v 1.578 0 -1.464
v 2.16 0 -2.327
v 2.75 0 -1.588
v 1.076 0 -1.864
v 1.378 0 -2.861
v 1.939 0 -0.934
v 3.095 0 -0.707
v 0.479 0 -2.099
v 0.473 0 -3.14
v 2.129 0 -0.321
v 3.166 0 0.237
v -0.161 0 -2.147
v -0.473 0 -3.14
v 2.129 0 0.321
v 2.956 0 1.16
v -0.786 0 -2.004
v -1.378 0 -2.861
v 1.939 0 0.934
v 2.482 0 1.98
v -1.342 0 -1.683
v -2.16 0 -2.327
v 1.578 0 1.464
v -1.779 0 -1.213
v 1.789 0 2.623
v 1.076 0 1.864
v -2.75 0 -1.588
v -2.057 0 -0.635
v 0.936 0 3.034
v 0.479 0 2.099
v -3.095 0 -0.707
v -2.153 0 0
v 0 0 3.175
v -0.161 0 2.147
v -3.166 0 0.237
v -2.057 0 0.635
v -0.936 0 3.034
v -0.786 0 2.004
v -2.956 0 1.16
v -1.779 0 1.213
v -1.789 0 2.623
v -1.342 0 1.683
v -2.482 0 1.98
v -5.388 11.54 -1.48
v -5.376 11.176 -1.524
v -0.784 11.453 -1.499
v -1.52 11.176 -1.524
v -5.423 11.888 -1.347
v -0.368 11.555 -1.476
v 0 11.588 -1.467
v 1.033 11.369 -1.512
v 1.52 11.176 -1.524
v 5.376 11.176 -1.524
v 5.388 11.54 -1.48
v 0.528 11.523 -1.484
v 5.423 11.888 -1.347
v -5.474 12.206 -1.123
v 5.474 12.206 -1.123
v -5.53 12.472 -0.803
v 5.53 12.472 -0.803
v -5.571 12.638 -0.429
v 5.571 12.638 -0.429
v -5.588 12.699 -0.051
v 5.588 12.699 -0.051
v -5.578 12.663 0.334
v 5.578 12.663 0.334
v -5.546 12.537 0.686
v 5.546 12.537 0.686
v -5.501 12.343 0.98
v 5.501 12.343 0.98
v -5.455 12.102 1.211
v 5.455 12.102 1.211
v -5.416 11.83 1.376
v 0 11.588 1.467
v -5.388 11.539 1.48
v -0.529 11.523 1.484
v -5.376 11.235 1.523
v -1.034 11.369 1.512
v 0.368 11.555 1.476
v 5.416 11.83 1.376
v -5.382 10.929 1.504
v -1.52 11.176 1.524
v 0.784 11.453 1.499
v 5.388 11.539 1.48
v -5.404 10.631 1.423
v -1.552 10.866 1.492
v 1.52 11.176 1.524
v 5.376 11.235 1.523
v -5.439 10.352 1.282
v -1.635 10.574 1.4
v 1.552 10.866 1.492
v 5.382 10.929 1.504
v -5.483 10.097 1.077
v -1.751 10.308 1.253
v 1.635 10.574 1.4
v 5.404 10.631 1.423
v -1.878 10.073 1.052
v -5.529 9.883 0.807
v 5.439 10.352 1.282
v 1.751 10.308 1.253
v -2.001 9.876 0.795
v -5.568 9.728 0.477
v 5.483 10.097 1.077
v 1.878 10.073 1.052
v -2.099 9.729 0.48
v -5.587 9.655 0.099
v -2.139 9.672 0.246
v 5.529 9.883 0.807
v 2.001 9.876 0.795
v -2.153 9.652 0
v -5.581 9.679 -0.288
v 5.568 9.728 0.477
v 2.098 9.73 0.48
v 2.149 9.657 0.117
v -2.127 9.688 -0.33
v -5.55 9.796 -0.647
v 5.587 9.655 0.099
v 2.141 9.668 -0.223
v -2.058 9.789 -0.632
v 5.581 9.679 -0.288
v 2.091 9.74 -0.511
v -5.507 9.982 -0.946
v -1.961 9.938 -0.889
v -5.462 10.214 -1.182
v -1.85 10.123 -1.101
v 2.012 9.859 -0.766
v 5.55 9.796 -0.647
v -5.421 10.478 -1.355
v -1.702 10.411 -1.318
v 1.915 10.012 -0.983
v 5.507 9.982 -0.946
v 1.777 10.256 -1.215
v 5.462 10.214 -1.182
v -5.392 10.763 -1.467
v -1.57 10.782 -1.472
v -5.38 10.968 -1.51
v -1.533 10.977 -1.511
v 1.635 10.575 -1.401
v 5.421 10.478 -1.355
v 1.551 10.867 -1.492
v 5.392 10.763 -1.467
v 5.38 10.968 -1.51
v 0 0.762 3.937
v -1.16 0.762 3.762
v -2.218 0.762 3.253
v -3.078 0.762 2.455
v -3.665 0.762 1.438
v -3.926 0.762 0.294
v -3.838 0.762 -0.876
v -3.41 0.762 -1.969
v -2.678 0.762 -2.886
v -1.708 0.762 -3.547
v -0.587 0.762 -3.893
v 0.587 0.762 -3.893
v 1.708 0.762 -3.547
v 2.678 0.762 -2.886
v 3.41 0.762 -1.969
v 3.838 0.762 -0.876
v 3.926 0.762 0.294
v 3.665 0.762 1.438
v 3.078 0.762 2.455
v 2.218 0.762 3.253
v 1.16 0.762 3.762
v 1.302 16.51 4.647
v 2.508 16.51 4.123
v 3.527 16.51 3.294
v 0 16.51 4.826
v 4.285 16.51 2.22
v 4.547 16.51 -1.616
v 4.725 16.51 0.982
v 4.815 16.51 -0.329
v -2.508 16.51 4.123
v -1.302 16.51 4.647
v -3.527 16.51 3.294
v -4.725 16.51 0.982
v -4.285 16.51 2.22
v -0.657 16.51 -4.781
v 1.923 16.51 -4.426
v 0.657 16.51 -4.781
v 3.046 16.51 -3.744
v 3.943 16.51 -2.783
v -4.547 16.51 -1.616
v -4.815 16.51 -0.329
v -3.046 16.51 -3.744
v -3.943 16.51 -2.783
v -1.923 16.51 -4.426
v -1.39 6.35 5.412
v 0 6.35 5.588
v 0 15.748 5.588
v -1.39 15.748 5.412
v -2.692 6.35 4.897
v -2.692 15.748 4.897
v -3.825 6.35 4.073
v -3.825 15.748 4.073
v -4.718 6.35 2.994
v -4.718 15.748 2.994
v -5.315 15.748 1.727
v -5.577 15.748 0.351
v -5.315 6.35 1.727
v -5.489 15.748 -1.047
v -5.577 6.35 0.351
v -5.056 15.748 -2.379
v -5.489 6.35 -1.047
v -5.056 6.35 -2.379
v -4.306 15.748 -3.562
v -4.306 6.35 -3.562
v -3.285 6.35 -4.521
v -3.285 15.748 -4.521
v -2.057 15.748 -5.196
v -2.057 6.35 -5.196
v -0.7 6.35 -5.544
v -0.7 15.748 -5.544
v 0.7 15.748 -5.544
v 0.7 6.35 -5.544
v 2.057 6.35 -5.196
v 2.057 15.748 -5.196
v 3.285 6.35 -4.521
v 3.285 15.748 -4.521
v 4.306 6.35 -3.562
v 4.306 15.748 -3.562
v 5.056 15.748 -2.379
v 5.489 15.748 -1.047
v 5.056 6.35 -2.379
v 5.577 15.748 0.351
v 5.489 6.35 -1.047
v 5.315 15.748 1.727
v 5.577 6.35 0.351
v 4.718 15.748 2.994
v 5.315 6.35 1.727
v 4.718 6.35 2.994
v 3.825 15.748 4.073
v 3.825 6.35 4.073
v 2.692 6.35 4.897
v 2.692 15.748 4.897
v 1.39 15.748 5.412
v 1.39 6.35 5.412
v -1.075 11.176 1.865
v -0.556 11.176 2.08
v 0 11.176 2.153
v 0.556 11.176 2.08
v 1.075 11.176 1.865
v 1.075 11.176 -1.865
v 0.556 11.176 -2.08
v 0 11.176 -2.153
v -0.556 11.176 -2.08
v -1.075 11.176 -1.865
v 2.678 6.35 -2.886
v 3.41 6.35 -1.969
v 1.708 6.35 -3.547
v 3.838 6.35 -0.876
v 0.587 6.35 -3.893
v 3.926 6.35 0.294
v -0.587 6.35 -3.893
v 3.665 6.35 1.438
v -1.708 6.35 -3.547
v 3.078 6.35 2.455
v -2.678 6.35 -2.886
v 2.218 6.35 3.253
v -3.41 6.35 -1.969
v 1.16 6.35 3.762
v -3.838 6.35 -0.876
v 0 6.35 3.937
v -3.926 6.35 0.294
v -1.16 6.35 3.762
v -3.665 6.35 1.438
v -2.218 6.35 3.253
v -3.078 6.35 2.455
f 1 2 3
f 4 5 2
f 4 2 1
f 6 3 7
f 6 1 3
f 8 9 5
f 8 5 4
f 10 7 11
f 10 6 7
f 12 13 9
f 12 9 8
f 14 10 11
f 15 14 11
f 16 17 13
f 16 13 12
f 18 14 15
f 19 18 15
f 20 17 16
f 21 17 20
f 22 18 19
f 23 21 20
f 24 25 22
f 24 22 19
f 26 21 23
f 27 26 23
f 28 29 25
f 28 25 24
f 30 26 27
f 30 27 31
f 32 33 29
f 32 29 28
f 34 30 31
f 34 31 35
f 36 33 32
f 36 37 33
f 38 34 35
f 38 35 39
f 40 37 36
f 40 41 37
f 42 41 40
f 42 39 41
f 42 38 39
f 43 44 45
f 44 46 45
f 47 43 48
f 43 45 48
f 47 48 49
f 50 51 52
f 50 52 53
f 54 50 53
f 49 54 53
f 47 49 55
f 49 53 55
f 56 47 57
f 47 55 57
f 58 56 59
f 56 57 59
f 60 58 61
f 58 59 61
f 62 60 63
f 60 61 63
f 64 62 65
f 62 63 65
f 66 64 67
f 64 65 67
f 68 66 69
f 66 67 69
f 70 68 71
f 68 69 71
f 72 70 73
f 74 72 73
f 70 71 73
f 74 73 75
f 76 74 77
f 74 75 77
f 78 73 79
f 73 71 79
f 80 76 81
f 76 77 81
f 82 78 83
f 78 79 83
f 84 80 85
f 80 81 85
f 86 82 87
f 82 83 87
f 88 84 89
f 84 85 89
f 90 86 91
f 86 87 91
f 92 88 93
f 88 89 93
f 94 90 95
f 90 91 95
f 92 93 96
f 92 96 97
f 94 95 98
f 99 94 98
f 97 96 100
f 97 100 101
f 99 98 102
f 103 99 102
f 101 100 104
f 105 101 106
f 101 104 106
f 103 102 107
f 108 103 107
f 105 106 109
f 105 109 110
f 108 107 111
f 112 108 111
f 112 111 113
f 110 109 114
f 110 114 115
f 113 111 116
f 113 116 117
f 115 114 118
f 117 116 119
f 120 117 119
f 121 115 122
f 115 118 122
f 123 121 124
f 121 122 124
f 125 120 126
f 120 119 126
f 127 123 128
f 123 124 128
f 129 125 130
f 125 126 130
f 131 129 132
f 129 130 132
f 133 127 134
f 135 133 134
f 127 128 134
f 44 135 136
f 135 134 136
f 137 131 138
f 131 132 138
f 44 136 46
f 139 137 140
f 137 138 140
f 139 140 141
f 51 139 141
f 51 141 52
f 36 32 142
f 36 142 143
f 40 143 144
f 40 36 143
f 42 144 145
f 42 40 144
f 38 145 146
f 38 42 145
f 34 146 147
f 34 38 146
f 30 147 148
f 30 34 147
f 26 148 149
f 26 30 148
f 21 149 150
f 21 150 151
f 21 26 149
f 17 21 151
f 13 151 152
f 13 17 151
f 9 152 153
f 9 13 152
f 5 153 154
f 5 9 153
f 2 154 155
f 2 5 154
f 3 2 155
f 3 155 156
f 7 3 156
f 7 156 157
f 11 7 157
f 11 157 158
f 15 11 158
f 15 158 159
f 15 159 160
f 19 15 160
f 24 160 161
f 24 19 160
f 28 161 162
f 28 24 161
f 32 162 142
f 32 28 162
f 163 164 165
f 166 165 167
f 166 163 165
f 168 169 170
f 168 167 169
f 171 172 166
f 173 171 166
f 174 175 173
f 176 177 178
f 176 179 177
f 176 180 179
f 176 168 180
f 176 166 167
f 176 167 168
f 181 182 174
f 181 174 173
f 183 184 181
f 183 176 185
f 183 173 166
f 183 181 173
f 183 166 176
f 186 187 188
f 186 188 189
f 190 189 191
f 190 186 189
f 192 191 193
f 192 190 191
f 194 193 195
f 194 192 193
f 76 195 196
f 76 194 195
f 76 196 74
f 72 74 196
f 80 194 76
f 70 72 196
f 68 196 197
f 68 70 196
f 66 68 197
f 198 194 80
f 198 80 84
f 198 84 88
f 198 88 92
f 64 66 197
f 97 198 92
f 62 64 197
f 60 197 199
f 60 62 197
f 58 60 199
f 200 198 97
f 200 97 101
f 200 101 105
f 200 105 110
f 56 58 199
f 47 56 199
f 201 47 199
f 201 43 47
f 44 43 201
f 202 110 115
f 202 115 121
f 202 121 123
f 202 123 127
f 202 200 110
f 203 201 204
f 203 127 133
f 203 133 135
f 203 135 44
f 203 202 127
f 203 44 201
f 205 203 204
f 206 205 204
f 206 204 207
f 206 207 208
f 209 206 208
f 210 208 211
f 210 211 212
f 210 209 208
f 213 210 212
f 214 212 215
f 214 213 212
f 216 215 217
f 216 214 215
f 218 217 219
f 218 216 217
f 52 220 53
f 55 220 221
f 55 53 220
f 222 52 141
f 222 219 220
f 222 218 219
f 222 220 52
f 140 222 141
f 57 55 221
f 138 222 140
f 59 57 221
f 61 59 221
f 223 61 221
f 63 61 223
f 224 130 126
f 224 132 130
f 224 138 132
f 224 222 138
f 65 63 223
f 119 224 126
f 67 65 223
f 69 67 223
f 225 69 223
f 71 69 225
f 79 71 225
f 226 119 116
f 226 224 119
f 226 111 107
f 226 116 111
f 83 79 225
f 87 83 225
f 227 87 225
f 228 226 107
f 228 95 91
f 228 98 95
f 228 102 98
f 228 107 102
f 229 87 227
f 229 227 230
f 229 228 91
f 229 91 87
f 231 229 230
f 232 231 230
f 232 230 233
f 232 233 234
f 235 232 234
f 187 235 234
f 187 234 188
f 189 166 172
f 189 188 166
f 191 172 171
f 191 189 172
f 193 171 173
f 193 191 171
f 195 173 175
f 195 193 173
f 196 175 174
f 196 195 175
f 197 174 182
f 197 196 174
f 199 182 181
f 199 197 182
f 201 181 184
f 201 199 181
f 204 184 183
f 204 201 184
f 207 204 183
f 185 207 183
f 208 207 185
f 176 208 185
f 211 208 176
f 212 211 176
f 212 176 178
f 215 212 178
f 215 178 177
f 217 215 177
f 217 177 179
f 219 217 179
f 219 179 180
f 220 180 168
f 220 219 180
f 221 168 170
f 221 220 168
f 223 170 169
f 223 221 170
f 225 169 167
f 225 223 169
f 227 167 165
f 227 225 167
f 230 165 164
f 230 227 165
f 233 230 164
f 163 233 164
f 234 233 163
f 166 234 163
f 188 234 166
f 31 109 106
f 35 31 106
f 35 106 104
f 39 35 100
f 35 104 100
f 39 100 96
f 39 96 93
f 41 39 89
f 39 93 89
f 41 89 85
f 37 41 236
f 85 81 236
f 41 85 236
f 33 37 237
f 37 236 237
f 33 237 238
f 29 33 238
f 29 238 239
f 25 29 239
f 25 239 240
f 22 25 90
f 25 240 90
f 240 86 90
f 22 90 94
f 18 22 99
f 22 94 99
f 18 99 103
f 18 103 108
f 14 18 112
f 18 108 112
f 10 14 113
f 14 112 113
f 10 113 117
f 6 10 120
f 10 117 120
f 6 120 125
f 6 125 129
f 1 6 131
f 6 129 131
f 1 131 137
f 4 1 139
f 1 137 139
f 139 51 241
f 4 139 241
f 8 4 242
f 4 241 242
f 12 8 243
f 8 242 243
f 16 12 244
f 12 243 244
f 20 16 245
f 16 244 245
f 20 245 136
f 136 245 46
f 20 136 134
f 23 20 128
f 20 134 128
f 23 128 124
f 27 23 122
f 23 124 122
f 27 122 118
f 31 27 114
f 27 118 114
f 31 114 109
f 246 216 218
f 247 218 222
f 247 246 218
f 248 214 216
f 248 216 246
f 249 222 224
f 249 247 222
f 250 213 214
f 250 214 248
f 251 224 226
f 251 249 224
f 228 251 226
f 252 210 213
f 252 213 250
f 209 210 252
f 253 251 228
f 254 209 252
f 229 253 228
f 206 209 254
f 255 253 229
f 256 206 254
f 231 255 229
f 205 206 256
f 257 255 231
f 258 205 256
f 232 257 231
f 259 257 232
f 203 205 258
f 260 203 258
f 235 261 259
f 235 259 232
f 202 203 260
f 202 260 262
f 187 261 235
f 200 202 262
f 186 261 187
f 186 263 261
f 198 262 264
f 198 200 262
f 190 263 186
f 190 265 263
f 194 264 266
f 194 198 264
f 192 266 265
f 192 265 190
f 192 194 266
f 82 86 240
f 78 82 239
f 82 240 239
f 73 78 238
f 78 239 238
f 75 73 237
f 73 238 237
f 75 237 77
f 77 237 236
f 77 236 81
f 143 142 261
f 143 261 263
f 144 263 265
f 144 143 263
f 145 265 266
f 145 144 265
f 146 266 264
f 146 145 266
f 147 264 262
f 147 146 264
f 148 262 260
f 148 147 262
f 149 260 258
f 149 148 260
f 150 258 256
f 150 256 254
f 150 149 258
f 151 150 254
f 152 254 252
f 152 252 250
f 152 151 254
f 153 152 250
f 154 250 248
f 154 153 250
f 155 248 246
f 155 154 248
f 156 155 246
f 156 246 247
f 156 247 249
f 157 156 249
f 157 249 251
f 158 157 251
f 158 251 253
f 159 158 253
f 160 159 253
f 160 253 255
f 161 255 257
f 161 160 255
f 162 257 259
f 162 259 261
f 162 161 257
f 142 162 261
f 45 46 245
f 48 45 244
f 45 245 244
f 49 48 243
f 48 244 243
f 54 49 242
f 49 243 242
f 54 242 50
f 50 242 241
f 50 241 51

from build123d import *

# Parameters (mm, degrees)
F_18_0_1695_DIAMETER_HOLE1_D     = 4.3053
F_18_0_1695_DIAMETER_HOLE1_DEPTH = 11.176
F_18_0_1695_DIAMETER_HOLE1_TIP   = 1.293442612
SKETCH4_R                        = 1.524
CUT_EXTRUDE1_DEPTH               = 11.43
CHAMFER1_SIZE                    = 0.762


with BuildPart() as part:
    # Sketch1 → Revolve1 (revolve)
    with BuildSketch(Plane.XY, mode=Mode.PRIVATE) as revolve1_sk:
        Polygon((0, 0), (0, 16.51), (4.826, 16.51), (5.588, 15.748), (5.588, 6.35), (3.937, 6.35), (3.937, 0), align=None)
    revolve(revolve1_sk.sketch.rotate(Axis((0, 0, 0), (0, -1, 0)), 90), axis=Axis((0, 0, 0), (0, -1, 0)))

    # #18 (0.1695) Diameter Hole1
    with Locations(Plane.XZ):
        with Locations((0, 0)):
            Hole(F_18_0_1695_DIAMETER_HOLE1_D / 2, depth=F_18_0_1695_DIAMETER_HOLE1_DEPTH)
            with Locations((0, 0, -(F_18_0_1695_DIAMETER_HOLE1_DEPTH + F_18_0_1695_DIAMETER_HOLE1_TIP / 2))):  # 118° drill point
                Cone(0, F_18_0_1695_DIAMETER_HOLE1_D / 2, F_18_0_1695_DIAMETER_HOLE1_TIP, mode=Mode.SUBTRACT)

    # Sketch4 → Cut-Extrude1 (cut, symmetric)
    with BuildSketch(Plane(origin=(0, 0, 0), x_dir=(0, 0, -1), z_dir=(1, 0, 0))):
        with Locations((0, 11.176)):
            Circle(SKETCH4_R)
    extrude(amount=CUT_EXTRUDE1_DEPTH, both=True, mode=Mode.SUBTRACT)

    # Chamfer1
    chamfer1_edges = [part.edges().sort_by_distance(p)[0] for p in [
        (0, 0, -3.937),
    ]]
    chamfer(chamfer1_edges, length=CHAMFER1_SIZE)


solid = part.part
